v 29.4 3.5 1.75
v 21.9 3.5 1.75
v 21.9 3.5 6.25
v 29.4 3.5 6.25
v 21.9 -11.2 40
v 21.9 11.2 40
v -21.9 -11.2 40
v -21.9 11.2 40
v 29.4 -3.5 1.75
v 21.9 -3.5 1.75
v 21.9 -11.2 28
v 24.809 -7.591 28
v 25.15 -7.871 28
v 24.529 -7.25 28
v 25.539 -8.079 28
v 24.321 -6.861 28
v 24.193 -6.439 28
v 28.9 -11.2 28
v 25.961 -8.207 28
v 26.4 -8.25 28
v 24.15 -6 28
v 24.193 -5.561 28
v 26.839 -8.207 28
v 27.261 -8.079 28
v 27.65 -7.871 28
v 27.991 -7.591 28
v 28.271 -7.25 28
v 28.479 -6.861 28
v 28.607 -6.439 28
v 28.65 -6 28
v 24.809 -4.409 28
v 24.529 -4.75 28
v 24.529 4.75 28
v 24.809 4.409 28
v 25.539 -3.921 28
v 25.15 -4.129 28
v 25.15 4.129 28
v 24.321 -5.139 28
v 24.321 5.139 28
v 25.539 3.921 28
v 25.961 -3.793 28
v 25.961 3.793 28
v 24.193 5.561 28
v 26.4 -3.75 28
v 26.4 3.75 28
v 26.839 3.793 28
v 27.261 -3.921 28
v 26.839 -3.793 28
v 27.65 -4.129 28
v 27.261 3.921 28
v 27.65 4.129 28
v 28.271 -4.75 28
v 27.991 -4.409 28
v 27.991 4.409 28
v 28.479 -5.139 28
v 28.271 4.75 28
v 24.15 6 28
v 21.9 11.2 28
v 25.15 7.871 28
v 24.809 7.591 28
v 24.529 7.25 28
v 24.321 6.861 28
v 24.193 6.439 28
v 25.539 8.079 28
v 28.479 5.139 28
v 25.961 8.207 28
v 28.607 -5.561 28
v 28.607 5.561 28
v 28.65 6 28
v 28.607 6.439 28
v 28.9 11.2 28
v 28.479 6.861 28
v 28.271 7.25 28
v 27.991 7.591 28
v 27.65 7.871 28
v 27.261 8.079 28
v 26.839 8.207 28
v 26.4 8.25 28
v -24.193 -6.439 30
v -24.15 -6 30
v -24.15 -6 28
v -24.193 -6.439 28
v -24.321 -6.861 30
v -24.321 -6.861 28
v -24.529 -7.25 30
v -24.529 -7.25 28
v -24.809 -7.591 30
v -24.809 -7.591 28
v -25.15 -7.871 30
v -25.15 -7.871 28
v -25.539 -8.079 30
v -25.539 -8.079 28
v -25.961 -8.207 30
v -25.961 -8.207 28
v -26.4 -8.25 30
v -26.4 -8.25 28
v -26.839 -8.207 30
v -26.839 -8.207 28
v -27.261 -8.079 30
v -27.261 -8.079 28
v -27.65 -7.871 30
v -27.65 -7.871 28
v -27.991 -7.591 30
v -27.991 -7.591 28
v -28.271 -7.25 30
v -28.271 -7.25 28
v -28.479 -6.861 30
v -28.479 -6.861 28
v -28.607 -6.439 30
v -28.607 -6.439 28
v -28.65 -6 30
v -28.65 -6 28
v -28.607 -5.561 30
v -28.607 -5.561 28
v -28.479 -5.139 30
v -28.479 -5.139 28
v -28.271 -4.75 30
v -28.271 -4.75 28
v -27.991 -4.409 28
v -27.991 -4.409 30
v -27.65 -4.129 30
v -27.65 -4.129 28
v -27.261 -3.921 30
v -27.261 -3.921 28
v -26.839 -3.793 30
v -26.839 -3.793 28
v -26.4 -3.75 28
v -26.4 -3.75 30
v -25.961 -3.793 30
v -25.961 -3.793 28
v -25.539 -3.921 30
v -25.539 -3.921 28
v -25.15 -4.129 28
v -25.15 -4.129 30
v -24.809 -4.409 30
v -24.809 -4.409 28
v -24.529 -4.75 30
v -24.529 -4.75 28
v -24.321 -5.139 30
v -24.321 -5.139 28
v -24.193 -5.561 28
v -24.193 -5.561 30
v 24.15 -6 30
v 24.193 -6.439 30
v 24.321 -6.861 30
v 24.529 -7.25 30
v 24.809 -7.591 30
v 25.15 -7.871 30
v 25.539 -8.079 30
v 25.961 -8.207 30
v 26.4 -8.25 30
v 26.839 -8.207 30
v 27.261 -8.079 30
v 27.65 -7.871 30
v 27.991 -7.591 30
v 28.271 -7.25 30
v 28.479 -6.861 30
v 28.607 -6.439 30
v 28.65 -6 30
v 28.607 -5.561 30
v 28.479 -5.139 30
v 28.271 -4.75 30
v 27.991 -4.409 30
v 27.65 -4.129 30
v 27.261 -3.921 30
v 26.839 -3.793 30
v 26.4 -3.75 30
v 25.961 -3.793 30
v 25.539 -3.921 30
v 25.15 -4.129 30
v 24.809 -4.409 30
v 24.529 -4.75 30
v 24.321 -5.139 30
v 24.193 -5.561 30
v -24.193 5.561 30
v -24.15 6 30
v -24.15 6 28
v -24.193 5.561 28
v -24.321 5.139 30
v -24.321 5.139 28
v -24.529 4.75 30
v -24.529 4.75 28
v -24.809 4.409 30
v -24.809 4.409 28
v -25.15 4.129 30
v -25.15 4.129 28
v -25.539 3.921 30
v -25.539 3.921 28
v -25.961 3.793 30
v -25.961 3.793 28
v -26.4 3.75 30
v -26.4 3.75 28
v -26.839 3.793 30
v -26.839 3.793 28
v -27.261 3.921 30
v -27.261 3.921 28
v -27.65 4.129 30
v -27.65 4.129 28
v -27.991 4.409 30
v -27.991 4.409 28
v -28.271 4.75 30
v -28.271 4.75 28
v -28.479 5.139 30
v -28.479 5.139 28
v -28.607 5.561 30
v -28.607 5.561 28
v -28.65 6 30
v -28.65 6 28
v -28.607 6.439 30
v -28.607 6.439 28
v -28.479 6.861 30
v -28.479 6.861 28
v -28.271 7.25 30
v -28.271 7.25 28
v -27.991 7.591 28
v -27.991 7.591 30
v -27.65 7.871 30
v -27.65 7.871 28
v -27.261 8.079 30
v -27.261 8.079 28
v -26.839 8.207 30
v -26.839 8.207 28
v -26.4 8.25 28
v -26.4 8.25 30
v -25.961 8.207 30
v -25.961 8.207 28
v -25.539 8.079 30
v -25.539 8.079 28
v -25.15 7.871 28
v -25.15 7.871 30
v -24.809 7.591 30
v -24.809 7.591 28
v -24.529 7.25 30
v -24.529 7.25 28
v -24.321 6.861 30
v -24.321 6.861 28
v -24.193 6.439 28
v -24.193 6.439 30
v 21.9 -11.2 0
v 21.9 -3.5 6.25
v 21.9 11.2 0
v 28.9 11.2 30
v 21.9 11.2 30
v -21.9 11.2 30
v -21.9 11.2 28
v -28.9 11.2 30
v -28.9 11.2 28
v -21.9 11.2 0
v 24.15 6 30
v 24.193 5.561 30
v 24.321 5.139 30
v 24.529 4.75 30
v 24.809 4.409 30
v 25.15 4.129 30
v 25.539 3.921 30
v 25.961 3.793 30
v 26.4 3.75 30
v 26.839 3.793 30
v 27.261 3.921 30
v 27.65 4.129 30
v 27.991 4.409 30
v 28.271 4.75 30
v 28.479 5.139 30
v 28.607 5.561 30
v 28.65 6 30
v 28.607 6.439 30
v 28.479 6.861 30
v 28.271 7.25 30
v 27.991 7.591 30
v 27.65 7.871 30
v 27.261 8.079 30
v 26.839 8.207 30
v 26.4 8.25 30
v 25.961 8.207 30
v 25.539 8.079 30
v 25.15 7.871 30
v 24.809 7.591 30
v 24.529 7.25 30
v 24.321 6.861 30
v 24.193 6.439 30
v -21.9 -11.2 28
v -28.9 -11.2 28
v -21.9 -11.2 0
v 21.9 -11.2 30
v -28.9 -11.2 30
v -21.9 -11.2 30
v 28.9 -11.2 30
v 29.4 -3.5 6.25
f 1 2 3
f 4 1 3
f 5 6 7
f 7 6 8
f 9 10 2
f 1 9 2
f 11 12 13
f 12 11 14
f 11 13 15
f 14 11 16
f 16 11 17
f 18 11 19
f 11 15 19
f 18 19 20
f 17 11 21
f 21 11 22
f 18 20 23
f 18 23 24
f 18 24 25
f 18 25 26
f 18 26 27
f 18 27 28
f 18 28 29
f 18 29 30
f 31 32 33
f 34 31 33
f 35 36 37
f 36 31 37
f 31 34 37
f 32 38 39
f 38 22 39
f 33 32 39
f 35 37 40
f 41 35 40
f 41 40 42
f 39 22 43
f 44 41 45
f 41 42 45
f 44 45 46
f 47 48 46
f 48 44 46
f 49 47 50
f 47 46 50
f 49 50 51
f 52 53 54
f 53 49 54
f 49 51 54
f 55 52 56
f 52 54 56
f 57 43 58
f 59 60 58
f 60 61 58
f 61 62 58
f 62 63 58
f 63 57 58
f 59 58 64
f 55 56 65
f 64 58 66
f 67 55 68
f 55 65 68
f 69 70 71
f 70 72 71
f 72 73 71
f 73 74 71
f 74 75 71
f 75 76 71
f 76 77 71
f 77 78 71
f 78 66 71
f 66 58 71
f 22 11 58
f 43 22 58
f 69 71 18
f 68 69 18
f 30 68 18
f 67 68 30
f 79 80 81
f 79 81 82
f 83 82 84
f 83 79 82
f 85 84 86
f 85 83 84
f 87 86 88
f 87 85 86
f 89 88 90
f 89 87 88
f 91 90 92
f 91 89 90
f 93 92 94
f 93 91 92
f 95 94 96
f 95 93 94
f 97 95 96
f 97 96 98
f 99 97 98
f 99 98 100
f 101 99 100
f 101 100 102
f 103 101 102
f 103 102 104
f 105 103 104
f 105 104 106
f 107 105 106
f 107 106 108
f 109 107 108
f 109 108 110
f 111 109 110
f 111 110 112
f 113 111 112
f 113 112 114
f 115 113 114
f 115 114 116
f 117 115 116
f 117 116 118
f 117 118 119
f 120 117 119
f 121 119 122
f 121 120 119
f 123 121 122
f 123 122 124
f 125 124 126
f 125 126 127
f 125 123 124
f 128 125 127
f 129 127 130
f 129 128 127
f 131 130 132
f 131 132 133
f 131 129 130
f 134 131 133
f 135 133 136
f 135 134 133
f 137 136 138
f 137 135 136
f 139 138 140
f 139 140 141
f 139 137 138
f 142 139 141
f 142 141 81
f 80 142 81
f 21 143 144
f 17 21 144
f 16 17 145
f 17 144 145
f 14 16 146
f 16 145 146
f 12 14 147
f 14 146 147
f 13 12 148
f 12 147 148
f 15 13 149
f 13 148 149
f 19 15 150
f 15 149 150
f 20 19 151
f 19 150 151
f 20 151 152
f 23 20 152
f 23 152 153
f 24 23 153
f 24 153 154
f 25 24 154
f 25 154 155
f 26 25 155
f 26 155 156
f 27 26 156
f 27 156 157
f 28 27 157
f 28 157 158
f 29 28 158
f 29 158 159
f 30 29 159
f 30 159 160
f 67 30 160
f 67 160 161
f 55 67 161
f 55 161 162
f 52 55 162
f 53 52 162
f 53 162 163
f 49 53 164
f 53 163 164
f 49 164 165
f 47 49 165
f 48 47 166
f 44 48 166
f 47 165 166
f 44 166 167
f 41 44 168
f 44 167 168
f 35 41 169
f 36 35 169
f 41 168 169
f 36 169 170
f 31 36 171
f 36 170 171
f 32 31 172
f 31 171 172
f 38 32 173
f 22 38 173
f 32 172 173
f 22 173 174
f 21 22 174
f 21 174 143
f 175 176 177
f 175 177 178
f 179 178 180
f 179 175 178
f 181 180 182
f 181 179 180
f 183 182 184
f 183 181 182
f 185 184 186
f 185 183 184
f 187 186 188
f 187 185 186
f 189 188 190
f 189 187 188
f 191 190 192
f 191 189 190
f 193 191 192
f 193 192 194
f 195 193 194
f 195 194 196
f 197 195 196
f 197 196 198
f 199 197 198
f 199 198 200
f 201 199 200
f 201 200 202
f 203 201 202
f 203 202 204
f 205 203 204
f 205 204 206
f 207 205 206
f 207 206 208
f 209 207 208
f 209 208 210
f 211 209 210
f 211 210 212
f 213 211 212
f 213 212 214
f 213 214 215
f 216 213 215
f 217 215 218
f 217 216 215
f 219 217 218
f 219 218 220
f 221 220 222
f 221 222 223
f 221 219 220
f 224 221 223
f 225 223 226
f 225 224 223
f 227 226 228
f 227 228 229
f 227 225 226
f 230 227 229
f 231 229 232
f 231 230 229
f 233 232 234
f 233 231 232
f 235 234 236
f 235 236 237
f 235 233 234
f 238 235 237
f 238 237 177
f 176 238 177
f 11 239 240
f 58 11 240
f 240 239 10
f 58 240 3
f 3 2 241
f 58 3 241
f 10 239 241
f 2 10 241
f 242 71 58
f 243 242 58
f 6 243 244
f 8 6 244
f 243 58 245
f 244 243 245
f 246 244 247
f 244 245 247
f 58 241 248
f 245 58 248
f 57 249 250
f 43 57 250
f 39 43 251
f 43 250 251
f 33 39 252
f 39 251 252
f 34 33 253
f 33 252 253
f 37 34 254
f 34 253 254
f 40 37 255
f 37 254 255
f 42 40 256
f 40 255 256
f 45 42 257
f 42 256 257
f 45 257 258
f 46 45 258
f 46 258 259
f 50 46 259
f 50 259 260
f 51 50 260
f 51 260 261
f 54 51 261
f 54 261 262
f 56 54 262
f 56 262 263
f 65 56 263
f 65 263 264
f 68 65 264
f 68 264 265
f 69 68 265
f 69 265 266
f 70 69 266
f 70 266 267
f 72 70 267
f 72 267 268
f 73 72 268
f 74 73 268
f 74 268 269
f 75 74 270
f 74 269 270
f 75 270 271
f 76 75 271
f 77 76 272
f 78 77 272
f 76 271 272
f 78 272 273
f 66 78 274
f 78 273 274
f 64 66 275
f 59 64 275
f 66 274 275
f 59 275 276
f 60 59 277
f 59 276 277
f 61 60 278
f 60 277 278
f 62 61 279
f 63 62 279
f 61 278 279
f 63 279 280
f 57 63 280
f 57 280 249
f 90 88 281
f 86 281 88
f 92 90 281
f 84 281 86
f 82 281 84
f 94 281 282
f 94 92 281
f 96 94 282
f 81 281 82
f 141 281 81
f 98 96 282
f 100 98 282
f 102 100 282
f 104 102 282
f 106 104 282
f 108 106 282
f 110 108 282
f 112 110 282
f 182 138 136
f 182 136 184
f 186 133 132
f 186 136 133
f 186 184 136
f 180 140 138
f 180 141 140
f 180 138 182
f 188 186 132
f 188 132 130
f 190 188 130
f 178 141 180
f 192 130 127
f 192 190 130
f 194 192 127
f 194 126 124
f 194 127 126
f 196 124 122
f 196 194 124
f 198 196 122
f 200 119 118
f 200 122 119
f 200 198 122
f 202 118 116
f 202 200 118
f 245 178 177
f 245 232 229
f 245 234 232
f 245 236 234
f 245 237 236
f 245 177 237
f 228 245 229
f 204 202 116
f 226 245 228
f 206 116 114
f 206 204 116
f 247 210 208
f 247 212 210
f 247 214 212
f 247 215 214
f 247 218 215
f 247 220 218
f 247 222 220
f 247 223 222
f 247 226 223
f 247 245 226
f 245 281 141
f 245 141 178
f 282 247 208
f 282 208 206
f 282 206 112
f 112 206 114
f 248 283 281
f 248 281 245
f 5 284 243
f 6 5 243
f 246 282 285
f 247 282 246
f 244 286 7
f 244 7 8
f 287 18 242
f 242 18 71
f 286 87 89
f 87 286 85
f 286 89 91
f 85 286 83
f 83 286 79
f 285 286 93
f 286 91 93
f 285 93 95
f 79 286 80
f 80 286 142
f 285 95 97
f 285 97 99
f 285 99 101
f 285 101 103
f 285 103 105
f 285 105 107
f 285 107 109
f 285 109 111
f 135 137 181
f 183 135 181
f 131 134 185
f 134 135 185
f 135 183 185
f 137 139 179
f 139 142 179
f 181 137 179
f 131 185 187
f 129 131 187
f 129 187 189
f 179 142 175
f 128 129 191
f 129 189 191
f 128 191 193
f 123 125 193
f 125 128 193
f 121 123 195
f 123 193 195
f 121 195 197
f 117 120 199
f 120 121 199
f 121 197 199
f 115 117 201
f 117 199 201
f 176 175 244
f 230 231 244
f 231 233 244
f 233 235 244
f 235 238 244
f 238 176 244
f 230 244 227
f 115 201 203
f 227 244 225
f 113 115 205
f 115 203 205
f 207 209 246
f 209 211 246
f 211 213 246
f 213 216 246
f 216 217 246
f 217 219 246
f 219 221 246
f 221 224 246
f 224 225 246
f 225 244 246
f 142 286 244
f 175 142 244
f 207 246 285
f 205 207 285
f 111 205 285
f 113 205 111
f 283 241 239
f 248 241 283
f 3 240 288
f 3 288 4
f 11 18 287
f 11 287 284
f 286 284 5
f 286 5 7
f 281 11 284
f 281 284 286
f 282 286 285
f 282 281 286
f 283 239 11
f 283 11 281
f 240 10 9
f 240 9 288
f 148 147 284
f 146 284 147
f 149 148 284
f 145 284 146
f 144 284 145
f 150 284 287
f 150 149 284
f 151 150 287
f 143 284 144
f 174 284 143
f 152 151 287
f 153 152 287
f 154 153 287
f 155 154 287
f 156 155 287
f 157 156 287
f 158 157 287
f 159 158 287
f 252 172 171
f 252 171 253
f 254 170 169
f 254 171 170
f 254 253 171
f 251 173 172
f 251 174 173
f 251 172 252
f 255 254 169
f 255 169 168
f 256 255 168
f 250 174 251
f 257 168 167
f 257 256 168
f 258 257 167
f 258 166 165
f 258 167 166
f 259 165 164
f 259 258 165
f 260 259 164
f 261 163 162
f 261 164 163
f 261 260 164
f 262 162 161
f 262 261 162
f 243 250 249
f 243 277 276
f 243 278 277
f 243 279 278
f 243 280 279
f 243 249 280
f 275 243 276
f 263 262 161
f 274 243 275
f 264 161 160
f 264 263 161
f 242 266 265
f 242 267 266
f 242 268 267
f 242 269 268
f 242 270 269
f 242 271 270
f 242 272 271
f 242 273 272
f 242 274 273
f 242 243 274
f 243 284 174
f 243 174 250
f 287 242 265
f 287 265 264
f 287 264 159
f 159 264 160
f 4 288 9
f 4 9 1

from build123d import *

# Parameters (mm, degrees)
F0_W     = 21.9
F0_H     = 22.4
F1_DEPTH = 40
F2_START = 28
F0_W_2   = 7
F2_DEPTH = 2
F3_D     = 4.5
F5_W     = 7
F5_H     = 4.5
F6_DEPTH = 7.5


with BuildPart() as f1:
    # F0 (on Top) → F1 (new body)
    with BuildSketch(Plane.XY):
        with Locations((10.95, 0)):
            Rectangle(F0_W, F0_H)
    extrude(amount=F1_DEPTH)

    # F0 (on Top) → F2 (join)
    with BuildSketch(Plane.XY.offset(F2_START)):
        with Locations((25.4, 0)):
            Rectangle(F0_W_2, F0_H)
    extrude(amount=F2_DEPTH)

    # F3 (through all)
    with Locations(Plane(origin=(0, 0, 0), x_dir=(1, 0, 0), z_dir=(0, 0, -1))):
        with Locations((26.4, 6), (26.4, -6)):
            Hole(F3_D / 2)

    # F4: F1 across face


with BuildPart() as f1_1:
    add(f1.part)
    add(f1.part.mirror(Plane(origin=(0, 0, 20), x_dir=(0, -1, 0), z_dir=(-1, 0, 0))))

    # F5 (on face) → F6 (join)
    with BuildSketch(Plane.YZ.offset(21.9)):
        with Locations((0, 4)):
            Rectangle(F5_W, F5_H)
    extrude(amount=F6_DEPTH)


solid = f1_1.part
